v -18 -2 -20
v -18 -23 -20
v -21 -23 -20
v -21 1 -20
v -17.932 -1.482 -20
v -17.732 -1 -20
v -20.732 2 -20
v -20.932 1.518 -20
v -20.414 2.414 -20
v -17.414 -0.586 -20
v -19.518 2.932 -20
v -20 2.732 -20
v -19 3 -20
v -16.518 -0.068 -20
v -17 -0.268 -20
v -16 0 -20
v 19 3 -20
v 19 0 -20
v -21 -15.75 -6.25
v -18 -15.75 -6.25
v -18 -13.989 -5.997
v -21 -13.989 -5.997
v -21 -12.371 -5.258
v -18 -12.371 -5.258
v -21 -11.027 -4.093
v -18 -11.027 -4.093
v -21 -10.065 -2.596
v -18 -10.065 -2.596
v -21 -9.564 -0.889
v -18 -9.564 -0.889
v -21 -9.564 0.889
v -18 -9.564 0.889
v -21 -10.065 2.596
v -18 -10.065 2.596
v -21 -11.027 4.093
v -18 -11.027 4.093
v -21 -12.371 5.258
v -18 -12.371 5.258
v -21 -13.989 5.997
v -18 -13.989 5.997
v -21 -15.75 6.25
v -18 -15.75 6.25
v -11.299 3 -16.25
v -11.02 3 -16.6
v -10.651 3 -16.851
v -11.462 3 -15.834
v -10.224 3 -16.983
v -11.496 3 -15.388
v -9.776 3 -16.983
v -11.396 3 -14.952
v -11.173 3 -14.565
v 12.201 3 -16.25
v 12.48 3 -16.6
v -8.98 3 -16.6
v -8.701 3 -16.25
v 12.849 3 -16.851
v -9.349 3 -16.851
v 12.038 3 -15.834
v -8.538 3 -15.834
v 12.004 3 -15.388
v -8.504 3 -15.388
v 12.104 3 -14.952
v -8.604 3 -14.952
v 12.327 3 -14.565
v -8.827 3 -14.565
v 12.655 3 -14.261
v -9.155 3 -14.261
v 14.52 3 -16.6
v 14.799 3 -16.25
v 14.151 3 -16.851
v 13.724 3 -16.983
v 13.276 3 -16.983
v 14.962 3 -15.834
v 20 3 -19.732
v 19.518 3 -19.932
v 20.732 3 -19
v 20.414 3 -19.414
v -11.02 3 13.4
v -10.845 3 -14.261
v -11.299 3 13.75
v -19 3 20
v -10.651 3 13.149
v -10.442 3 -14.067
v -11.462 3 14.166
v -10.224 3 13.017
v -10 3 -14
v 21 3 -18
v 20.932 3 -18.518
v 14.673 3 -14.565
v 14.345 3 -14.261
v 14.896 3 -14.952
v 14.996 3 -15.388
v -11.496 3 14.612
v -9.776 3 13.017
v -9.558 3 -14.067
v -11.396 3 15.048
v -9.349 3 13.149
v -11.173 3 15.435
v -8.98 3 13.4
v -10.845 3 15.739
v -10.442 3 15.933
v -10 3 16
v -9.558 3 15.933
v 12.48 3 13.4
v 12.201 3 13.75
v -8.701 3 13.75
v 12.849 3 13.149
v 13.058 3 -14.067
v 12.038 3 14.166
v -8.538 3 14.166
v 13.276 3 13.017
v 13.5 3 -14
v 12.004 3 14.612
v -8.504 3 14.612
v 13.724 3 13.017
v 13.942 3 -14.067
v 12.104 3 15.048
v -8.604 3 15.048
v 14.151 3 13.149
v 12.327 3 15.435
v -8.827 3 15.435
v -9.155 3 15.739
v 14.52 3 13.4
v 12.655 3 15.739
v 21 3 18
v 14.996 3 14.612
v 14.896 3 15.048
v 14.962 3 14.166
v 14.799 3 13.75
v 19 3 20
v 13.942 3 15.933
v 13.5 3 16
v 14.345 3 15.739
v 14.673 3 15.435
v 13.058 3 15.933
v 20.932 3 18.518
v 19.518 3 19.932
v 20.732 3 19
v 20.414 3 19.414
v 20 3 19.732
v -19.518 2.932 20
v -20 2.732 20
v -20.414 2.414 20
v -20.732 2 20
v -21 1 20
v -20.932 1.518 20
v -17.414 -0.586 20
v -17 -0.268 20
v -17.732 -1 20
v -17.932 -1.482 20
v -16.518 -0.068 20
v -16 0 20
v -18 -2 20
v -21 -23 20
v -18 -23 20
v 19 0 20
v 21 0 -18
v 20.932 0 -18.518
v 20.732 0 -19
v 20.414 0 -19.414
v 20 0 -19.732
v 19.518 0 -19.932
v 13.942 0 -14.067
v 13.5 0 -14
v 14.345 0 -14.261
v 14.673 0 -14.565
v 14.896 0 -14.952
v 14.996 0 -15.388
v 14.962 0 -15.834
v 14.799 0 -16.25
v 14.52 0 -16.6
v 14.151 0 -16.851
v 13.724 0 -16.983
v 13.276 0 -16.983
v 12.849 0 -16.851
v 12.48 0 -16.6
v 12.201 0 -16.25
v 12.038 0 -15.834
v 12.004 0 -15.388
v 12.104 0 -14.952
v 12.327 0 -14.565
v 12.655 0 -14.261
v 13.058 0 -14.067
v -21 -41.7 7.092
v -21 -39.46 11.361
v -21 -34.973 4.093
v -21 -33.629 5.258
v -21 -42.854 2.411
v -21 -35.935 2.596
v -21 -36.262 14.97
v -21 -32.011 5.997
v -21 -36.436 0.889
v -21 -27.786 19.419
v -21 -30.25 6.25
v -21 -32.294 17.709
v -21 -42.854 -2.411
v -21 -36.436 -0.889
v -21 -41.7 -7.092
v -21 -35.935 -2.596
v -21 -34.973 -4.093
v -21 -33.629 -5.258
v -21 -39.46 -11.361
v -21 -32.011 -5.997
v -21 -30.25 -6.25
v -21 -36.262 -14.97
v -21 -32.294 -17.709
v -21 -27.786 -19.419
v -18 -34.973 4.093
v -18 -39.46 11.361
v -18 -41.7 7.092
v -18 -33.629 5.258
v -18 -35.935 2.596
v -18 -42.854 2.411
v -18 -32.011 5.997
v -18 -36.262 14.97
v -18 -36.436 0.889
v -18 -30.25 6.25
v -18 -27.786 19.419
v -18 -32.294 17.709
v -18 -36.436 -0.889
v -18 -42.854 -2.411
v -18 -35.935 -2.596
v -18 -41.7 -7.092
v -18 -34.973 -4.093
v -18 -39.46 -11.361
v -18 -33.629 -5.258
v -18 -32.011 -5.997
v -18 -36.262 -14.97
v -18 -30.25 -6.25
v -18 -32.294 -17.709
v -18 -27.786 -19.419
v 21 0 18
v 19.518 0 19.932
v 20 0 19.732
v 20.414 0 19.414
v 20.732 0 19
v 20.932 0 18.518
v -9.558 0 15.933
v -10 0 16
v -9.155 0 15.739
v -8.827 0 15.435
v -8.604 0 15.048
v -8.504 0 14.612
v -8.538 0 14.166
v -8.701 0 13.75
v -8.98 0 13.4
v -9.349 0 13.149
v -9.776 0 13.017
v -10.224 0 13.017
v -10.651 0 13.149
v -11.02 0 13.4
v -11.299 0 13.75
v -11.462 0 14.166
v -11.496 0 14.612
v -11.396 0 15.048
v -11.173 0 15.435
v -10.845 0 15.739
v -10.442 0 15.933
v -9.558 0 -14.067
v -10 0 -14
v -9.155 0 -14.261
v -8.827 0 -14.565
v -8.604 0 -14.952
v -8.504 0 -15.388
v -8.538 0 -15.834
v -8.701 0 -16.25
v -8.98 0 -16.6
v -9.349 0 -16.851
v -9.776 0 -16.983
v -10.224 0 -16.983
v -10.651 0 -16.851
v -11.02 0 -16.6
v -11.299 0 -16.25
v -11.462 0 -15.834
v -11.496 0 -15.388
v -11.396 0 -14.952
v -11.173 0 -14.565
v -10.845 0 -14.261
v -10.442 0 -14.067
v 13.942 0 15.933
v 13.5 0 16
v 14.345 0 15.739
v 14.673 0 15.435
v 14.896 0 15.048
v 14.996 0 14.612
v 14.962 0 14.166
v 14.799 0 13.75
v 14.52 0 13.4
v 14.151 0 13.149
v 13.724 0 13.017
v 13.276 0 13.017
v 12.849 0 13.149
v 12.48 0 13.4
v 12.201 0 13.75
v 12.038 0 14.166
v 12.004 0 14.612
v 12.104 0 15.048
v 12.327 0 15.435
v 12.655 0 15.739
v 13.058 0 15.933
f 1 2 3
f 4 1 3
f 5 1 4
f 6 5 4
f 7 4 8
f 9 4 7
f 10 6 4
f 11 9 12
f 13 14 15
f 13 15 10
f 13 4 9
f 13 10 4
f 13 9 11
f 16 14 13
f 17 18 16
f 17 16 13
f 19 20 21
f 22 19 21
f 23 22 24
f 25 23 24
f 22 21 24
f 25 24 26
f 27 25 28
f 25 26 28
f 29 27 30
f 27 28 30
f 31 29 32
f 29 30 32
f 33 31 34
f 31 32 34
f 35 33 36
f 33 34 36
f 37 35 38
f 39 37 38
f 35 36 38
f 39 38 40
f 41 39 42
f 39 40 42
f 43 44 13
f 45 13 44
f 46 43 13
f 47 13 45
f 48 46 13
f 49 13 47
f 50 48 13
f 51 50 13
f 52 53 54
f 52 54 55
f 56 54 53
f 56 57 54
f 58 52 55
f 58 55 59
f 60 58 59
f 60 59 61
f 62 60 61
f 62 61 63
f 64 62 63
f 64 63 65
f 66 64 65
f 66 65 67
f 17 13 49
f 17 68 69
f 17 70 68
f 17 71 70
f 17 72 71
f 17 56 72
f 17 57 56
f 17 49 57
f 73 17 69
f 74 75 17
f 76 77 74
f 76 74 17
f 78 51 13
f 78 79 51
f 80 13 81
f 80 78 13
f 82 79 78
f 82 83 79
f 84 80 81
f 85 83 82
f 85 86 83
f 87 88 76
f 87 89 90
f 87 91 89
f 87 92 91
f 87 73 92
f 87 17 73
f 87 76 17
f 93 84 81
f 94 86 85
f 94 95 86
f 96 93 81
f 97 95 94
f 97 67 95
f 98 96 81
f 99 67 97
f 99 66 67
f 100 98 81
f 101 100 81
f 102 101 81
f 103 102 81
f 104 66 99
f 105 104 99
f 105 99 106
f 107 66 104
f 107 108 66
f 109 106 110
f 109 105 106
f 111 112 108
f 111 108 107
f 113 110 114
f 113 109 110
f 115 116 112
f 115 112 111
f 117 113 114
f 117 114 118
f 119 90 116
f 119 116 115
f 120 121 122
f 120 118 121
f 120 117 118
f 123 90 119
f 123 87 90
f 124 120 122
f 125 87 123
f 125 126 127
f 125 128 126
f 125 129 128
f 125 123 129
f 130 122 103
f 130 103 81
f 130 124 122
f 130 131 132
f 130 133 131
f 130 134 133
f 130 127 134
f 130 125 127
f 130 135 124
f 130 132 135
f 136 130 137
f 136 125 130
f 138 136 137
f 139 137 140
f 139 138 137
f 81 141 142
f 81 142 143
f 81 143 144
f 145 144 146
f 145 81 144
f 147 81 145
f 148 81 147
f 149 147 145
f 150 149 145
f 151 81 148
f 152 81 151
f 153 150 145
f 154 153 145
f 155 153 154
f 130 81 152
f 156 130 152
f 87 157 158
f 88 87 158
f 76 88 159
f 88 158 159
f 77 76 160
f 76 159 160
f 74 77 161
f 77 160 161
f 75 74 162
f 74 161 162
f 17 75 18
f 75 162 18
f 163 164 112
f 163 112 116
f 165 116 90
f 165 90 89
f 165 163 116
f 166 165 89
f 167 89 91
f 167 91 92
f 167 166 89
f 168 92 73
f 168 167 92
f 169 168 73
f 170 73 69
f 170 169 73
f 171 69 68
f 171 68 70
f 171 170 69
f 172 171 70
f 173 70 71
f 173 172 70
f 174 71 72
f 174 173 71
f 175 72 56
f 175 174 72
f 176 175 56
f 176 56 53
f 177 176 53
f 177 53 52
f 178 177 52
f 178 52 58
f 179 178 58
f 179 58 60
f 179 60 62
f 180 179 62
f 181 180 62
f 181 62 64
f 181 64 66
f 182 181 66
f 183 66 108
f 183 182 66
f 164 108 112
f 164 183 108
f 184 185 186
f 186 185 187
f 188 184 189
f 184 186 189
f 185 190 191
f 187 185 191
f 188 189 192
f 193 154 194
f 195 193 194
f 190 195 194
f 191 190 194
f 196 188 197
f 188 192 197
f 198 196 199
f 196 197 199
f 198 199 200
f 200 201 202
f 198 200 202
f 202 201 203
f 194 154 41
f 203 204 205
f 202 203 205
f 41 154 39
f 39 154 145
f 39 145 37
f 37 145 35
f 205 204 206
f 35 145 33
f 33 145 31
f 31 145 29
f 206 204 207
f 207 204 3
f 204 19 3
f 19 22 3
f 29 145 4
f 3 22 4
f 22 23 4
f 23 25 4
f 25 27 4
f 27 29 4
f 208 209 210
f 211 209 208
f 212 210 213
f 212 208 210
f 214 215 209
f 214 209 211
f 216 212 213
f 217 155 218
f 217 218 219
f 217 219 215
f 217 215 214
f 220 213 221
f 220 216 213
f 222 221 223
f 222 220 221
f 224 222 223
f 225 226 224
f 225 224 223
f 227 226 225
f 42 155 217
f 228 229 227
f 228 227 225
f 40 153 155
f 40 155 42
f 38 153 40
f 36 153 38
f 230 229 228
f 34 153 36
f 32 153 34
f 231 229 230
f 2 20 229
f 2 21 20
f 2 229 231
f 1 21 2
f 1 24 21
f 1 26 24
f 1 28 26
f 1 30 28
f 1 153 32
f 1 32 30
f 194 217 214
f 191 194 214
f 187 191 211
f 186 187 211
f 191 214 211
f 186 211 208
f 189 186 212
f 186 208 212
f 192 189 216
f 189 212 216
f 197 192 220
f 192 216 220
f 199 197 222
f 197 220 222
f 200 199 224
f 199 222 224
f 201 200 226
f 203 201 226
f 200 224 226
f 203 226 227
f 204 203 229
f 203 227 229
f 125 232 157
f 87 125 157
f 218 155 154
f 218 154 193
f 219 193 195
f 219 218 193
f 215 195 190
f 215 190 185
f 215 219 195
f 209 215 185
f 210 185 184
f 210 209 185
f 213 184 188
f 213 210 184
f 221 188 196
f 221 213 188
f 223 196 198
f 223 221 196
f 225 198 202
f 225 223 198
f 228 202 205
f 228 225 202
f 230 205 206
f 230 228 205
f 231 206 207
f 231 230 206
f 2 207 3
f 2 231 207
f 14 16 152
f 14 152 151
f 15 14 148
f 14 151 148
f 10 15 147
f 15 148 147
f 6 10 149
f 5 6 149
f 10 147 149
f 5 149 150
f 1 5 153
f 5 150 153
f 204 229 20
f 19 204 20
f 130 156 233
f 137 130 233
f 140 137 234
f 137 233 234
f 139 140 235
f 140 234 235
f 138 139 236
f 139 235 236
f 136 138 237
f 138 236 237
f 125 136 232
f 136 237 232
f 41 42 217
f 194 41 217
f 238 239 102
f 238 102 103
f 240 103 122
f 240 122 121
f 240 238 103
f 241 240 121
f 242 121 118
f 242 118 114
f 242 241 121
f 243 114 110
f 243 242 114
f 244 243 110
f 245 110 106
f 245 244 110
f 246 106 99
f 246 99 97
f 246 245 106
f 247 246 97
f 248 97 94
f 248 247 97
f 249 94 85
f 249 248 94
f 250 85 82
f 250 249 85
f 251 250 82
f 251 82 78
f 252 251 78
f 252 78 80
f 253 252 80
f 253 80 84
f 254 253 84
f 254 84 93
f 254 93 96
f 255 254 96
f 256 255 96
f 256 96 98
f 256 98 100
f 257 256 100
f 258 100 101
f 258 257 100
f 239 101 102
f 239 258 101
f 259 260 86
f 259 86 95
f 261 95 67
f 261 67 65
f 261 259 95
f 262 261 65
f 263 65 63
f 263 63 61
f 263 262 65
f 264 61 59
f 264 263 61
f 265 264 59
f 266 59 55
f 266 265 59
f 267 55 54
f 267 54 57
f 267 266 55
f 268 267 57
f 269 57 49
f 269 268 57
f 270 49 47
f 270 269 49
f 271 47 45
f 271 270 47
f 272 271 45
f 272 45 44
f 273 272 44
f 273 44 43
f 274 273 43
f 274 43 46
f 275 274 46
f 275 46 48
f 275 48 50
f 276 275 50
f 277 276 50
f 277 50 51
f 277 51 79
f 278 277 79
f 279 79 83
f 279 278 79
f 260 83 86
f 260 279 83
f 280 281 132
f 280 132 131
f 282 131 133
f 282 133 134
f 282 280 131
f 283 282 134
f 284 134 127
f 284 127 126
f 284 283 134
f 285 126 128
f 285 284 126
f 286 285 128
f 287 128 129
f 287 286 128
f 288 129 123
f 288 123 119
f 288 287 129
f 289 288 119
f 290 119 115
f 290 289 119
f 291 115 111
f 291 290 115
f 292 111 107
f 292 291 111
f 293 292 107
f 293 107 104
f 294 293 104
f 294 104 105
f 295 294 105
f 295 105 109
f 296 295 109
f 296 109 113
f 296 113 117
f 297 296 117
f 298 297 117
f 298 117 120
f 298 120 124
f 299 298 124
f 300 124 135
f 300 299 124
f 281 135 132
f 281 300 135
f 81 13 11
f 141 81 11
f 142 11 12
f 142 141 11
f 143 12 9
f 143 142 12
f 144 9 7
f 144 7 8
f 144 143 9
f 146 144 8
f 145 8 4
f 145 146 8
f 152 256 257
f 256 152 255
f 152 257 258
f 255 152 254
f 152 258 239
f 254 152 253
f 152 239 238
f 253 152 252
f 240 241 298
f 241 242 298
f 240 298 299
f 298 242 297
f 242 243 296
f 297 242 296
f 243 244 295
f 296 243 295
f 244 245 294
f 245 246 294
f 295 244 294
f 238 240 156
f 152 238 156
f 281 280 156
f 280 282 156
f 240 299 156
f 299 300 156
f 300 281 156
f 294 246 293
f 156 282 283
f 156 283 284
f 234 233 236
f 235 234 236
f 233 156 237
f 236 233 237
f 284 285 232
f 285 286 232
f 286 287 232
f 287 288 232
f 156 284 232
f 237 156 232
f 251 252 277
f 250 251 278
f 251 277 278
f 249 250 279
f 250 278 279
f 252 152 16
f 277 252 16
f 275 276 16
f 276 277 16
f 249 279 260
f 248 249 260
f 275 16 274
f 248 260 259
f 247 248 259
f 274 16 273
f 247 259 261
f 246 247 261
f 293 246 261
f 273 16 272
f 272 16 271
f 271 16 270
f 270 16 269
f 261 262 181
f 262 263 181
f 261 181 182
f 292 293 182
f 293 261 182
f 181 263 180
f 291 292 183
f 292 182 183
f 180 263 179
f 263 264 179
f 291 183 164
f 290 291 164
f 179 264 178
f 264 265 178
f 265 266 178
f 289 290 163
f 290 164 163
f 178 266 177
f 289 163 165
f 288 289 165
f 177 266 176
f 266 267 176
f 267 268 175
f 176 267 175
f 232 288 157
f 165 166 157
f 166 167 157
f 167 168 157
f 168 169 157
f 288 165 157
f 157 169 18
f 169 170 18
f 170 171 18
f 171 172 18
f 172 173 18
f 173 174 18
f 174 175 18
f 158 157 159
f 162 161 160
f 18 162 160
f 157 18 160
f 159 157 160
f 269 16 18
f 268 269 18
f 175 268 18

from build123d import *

# Parameters (mm, degrees)
SKETCH1_R           = 1.5
BOSS_EXTRUDE1_DEPTH = 3
SKETCH2_W           = 40
SKETCH2_H           = 3
CUT_EXTRUDE1_DEPTH  = 3
BOSS_EXTRUDE2_DEPTH = 3
FILLET1_R           = 2
FILLET2_R           = 2


with BuildPart() as part:
    # Sketch1 → Boss-Extrude1 (new body)
    with BuildSketch(Plane(origin=(0, 0, 0), x_dir=(1, 0, 0), z_dir=(0, 1, 0))):
        with BuildLine():
            Line((-19, -20), (19, -20))
            ThreePointArc((19, -20), (20.414213562, -19.414213562), (21, -18))
            Line((21, -18), (21, 18))
            ThreePointArc((21, 18), (20.414213562, 19.414213562), (19, 20))
            Line((19, 20), (-19, 20))
            Line((-19, 20), (-21, 20))
            Line((-21, 20), (-21, 18))
            Line((-21, 18), (-21, -18))
            Line((-21, -18), (-21, -20))
            Line((-21, -20), (-19, -20))
        make_face()
        with Locations(Location((13.5, 15.5, 0), (0, 0, 270))):
            Circle(SKETCH1_R, mode=Mode.SUBTRACT)
        with Locations(Location((-10, 15.5, 0), (0, 0, 270))):
            Circle(SKETCH1_R, mode=Mode.SUBTRACT)
        with Locations(Location((-10, -14.5, 0), (0, 0, 270))):
            Circle(SKETCH1_R, mode=Mode.SUBTRACT)
        with Locations(Location((13.5, -14.5, 0), (0, 0, 270))):
            Circle(SKETCH1_R, mode=Mode.SUBTRACT)
    extrude(amount=BOSS_EXTRUDE1_DEPTH)

    # Sketch2 → Cut-Extrude1 (cut)
    with BuildSketch(Plane.ZY.offset(21)):
        with Locations((0, 1.5)):
            Rectangle(SKETCH2_W, SKETCH2_H)
    extrude(amount=-CUT_EXTRUDE1_DEPTH, mode=Mode.SUBTRACT)

    # Sketch3 → Boss-Extrude2 (add)
    with BuildSketch(Plane.ZY.offset(18)):
        with BuildLine():
            Line((-20, 3), (20, 3))
            Line((20, 3), (20, -23))
            ThreePointArc((20, -23), (0, -43), (-20, -23))
            Line((-20, -23), (-20, 3))
        make_face()
        with BuildLine():
            Line((-6.25, -30.25), (-6.25, -15.75))
            ThreePointArc((-6.25, -15.75), (0, -9.5), (6.25, -15.75))
            Line((6.25, -15.75), (6.25, -30.25))
            ThreePointArc((6.25, -30.25), (0, -36.5), (-6.25, -30.25))
        make_face(mode=Mode.SUBTRACT)
    extrude(amount=BOSS_EXTRUDE2_DEPTH)

    # Fillet1
    fillet1_edges = [part.edges().sort_by_distance(p)[0] for p in [
        (-21, 3, 0),
    ]]
    fillet(fillet1_edges, radius=FILLET1_R)

    # Fillet2
    fillet2_edges = [part.edges().sort_by_distance(p)[0] for p in [
        (-18, 0, 0),
    ]]
    fillet(fillet2_edges, radius=FILLET2_R)


solid = part.part
